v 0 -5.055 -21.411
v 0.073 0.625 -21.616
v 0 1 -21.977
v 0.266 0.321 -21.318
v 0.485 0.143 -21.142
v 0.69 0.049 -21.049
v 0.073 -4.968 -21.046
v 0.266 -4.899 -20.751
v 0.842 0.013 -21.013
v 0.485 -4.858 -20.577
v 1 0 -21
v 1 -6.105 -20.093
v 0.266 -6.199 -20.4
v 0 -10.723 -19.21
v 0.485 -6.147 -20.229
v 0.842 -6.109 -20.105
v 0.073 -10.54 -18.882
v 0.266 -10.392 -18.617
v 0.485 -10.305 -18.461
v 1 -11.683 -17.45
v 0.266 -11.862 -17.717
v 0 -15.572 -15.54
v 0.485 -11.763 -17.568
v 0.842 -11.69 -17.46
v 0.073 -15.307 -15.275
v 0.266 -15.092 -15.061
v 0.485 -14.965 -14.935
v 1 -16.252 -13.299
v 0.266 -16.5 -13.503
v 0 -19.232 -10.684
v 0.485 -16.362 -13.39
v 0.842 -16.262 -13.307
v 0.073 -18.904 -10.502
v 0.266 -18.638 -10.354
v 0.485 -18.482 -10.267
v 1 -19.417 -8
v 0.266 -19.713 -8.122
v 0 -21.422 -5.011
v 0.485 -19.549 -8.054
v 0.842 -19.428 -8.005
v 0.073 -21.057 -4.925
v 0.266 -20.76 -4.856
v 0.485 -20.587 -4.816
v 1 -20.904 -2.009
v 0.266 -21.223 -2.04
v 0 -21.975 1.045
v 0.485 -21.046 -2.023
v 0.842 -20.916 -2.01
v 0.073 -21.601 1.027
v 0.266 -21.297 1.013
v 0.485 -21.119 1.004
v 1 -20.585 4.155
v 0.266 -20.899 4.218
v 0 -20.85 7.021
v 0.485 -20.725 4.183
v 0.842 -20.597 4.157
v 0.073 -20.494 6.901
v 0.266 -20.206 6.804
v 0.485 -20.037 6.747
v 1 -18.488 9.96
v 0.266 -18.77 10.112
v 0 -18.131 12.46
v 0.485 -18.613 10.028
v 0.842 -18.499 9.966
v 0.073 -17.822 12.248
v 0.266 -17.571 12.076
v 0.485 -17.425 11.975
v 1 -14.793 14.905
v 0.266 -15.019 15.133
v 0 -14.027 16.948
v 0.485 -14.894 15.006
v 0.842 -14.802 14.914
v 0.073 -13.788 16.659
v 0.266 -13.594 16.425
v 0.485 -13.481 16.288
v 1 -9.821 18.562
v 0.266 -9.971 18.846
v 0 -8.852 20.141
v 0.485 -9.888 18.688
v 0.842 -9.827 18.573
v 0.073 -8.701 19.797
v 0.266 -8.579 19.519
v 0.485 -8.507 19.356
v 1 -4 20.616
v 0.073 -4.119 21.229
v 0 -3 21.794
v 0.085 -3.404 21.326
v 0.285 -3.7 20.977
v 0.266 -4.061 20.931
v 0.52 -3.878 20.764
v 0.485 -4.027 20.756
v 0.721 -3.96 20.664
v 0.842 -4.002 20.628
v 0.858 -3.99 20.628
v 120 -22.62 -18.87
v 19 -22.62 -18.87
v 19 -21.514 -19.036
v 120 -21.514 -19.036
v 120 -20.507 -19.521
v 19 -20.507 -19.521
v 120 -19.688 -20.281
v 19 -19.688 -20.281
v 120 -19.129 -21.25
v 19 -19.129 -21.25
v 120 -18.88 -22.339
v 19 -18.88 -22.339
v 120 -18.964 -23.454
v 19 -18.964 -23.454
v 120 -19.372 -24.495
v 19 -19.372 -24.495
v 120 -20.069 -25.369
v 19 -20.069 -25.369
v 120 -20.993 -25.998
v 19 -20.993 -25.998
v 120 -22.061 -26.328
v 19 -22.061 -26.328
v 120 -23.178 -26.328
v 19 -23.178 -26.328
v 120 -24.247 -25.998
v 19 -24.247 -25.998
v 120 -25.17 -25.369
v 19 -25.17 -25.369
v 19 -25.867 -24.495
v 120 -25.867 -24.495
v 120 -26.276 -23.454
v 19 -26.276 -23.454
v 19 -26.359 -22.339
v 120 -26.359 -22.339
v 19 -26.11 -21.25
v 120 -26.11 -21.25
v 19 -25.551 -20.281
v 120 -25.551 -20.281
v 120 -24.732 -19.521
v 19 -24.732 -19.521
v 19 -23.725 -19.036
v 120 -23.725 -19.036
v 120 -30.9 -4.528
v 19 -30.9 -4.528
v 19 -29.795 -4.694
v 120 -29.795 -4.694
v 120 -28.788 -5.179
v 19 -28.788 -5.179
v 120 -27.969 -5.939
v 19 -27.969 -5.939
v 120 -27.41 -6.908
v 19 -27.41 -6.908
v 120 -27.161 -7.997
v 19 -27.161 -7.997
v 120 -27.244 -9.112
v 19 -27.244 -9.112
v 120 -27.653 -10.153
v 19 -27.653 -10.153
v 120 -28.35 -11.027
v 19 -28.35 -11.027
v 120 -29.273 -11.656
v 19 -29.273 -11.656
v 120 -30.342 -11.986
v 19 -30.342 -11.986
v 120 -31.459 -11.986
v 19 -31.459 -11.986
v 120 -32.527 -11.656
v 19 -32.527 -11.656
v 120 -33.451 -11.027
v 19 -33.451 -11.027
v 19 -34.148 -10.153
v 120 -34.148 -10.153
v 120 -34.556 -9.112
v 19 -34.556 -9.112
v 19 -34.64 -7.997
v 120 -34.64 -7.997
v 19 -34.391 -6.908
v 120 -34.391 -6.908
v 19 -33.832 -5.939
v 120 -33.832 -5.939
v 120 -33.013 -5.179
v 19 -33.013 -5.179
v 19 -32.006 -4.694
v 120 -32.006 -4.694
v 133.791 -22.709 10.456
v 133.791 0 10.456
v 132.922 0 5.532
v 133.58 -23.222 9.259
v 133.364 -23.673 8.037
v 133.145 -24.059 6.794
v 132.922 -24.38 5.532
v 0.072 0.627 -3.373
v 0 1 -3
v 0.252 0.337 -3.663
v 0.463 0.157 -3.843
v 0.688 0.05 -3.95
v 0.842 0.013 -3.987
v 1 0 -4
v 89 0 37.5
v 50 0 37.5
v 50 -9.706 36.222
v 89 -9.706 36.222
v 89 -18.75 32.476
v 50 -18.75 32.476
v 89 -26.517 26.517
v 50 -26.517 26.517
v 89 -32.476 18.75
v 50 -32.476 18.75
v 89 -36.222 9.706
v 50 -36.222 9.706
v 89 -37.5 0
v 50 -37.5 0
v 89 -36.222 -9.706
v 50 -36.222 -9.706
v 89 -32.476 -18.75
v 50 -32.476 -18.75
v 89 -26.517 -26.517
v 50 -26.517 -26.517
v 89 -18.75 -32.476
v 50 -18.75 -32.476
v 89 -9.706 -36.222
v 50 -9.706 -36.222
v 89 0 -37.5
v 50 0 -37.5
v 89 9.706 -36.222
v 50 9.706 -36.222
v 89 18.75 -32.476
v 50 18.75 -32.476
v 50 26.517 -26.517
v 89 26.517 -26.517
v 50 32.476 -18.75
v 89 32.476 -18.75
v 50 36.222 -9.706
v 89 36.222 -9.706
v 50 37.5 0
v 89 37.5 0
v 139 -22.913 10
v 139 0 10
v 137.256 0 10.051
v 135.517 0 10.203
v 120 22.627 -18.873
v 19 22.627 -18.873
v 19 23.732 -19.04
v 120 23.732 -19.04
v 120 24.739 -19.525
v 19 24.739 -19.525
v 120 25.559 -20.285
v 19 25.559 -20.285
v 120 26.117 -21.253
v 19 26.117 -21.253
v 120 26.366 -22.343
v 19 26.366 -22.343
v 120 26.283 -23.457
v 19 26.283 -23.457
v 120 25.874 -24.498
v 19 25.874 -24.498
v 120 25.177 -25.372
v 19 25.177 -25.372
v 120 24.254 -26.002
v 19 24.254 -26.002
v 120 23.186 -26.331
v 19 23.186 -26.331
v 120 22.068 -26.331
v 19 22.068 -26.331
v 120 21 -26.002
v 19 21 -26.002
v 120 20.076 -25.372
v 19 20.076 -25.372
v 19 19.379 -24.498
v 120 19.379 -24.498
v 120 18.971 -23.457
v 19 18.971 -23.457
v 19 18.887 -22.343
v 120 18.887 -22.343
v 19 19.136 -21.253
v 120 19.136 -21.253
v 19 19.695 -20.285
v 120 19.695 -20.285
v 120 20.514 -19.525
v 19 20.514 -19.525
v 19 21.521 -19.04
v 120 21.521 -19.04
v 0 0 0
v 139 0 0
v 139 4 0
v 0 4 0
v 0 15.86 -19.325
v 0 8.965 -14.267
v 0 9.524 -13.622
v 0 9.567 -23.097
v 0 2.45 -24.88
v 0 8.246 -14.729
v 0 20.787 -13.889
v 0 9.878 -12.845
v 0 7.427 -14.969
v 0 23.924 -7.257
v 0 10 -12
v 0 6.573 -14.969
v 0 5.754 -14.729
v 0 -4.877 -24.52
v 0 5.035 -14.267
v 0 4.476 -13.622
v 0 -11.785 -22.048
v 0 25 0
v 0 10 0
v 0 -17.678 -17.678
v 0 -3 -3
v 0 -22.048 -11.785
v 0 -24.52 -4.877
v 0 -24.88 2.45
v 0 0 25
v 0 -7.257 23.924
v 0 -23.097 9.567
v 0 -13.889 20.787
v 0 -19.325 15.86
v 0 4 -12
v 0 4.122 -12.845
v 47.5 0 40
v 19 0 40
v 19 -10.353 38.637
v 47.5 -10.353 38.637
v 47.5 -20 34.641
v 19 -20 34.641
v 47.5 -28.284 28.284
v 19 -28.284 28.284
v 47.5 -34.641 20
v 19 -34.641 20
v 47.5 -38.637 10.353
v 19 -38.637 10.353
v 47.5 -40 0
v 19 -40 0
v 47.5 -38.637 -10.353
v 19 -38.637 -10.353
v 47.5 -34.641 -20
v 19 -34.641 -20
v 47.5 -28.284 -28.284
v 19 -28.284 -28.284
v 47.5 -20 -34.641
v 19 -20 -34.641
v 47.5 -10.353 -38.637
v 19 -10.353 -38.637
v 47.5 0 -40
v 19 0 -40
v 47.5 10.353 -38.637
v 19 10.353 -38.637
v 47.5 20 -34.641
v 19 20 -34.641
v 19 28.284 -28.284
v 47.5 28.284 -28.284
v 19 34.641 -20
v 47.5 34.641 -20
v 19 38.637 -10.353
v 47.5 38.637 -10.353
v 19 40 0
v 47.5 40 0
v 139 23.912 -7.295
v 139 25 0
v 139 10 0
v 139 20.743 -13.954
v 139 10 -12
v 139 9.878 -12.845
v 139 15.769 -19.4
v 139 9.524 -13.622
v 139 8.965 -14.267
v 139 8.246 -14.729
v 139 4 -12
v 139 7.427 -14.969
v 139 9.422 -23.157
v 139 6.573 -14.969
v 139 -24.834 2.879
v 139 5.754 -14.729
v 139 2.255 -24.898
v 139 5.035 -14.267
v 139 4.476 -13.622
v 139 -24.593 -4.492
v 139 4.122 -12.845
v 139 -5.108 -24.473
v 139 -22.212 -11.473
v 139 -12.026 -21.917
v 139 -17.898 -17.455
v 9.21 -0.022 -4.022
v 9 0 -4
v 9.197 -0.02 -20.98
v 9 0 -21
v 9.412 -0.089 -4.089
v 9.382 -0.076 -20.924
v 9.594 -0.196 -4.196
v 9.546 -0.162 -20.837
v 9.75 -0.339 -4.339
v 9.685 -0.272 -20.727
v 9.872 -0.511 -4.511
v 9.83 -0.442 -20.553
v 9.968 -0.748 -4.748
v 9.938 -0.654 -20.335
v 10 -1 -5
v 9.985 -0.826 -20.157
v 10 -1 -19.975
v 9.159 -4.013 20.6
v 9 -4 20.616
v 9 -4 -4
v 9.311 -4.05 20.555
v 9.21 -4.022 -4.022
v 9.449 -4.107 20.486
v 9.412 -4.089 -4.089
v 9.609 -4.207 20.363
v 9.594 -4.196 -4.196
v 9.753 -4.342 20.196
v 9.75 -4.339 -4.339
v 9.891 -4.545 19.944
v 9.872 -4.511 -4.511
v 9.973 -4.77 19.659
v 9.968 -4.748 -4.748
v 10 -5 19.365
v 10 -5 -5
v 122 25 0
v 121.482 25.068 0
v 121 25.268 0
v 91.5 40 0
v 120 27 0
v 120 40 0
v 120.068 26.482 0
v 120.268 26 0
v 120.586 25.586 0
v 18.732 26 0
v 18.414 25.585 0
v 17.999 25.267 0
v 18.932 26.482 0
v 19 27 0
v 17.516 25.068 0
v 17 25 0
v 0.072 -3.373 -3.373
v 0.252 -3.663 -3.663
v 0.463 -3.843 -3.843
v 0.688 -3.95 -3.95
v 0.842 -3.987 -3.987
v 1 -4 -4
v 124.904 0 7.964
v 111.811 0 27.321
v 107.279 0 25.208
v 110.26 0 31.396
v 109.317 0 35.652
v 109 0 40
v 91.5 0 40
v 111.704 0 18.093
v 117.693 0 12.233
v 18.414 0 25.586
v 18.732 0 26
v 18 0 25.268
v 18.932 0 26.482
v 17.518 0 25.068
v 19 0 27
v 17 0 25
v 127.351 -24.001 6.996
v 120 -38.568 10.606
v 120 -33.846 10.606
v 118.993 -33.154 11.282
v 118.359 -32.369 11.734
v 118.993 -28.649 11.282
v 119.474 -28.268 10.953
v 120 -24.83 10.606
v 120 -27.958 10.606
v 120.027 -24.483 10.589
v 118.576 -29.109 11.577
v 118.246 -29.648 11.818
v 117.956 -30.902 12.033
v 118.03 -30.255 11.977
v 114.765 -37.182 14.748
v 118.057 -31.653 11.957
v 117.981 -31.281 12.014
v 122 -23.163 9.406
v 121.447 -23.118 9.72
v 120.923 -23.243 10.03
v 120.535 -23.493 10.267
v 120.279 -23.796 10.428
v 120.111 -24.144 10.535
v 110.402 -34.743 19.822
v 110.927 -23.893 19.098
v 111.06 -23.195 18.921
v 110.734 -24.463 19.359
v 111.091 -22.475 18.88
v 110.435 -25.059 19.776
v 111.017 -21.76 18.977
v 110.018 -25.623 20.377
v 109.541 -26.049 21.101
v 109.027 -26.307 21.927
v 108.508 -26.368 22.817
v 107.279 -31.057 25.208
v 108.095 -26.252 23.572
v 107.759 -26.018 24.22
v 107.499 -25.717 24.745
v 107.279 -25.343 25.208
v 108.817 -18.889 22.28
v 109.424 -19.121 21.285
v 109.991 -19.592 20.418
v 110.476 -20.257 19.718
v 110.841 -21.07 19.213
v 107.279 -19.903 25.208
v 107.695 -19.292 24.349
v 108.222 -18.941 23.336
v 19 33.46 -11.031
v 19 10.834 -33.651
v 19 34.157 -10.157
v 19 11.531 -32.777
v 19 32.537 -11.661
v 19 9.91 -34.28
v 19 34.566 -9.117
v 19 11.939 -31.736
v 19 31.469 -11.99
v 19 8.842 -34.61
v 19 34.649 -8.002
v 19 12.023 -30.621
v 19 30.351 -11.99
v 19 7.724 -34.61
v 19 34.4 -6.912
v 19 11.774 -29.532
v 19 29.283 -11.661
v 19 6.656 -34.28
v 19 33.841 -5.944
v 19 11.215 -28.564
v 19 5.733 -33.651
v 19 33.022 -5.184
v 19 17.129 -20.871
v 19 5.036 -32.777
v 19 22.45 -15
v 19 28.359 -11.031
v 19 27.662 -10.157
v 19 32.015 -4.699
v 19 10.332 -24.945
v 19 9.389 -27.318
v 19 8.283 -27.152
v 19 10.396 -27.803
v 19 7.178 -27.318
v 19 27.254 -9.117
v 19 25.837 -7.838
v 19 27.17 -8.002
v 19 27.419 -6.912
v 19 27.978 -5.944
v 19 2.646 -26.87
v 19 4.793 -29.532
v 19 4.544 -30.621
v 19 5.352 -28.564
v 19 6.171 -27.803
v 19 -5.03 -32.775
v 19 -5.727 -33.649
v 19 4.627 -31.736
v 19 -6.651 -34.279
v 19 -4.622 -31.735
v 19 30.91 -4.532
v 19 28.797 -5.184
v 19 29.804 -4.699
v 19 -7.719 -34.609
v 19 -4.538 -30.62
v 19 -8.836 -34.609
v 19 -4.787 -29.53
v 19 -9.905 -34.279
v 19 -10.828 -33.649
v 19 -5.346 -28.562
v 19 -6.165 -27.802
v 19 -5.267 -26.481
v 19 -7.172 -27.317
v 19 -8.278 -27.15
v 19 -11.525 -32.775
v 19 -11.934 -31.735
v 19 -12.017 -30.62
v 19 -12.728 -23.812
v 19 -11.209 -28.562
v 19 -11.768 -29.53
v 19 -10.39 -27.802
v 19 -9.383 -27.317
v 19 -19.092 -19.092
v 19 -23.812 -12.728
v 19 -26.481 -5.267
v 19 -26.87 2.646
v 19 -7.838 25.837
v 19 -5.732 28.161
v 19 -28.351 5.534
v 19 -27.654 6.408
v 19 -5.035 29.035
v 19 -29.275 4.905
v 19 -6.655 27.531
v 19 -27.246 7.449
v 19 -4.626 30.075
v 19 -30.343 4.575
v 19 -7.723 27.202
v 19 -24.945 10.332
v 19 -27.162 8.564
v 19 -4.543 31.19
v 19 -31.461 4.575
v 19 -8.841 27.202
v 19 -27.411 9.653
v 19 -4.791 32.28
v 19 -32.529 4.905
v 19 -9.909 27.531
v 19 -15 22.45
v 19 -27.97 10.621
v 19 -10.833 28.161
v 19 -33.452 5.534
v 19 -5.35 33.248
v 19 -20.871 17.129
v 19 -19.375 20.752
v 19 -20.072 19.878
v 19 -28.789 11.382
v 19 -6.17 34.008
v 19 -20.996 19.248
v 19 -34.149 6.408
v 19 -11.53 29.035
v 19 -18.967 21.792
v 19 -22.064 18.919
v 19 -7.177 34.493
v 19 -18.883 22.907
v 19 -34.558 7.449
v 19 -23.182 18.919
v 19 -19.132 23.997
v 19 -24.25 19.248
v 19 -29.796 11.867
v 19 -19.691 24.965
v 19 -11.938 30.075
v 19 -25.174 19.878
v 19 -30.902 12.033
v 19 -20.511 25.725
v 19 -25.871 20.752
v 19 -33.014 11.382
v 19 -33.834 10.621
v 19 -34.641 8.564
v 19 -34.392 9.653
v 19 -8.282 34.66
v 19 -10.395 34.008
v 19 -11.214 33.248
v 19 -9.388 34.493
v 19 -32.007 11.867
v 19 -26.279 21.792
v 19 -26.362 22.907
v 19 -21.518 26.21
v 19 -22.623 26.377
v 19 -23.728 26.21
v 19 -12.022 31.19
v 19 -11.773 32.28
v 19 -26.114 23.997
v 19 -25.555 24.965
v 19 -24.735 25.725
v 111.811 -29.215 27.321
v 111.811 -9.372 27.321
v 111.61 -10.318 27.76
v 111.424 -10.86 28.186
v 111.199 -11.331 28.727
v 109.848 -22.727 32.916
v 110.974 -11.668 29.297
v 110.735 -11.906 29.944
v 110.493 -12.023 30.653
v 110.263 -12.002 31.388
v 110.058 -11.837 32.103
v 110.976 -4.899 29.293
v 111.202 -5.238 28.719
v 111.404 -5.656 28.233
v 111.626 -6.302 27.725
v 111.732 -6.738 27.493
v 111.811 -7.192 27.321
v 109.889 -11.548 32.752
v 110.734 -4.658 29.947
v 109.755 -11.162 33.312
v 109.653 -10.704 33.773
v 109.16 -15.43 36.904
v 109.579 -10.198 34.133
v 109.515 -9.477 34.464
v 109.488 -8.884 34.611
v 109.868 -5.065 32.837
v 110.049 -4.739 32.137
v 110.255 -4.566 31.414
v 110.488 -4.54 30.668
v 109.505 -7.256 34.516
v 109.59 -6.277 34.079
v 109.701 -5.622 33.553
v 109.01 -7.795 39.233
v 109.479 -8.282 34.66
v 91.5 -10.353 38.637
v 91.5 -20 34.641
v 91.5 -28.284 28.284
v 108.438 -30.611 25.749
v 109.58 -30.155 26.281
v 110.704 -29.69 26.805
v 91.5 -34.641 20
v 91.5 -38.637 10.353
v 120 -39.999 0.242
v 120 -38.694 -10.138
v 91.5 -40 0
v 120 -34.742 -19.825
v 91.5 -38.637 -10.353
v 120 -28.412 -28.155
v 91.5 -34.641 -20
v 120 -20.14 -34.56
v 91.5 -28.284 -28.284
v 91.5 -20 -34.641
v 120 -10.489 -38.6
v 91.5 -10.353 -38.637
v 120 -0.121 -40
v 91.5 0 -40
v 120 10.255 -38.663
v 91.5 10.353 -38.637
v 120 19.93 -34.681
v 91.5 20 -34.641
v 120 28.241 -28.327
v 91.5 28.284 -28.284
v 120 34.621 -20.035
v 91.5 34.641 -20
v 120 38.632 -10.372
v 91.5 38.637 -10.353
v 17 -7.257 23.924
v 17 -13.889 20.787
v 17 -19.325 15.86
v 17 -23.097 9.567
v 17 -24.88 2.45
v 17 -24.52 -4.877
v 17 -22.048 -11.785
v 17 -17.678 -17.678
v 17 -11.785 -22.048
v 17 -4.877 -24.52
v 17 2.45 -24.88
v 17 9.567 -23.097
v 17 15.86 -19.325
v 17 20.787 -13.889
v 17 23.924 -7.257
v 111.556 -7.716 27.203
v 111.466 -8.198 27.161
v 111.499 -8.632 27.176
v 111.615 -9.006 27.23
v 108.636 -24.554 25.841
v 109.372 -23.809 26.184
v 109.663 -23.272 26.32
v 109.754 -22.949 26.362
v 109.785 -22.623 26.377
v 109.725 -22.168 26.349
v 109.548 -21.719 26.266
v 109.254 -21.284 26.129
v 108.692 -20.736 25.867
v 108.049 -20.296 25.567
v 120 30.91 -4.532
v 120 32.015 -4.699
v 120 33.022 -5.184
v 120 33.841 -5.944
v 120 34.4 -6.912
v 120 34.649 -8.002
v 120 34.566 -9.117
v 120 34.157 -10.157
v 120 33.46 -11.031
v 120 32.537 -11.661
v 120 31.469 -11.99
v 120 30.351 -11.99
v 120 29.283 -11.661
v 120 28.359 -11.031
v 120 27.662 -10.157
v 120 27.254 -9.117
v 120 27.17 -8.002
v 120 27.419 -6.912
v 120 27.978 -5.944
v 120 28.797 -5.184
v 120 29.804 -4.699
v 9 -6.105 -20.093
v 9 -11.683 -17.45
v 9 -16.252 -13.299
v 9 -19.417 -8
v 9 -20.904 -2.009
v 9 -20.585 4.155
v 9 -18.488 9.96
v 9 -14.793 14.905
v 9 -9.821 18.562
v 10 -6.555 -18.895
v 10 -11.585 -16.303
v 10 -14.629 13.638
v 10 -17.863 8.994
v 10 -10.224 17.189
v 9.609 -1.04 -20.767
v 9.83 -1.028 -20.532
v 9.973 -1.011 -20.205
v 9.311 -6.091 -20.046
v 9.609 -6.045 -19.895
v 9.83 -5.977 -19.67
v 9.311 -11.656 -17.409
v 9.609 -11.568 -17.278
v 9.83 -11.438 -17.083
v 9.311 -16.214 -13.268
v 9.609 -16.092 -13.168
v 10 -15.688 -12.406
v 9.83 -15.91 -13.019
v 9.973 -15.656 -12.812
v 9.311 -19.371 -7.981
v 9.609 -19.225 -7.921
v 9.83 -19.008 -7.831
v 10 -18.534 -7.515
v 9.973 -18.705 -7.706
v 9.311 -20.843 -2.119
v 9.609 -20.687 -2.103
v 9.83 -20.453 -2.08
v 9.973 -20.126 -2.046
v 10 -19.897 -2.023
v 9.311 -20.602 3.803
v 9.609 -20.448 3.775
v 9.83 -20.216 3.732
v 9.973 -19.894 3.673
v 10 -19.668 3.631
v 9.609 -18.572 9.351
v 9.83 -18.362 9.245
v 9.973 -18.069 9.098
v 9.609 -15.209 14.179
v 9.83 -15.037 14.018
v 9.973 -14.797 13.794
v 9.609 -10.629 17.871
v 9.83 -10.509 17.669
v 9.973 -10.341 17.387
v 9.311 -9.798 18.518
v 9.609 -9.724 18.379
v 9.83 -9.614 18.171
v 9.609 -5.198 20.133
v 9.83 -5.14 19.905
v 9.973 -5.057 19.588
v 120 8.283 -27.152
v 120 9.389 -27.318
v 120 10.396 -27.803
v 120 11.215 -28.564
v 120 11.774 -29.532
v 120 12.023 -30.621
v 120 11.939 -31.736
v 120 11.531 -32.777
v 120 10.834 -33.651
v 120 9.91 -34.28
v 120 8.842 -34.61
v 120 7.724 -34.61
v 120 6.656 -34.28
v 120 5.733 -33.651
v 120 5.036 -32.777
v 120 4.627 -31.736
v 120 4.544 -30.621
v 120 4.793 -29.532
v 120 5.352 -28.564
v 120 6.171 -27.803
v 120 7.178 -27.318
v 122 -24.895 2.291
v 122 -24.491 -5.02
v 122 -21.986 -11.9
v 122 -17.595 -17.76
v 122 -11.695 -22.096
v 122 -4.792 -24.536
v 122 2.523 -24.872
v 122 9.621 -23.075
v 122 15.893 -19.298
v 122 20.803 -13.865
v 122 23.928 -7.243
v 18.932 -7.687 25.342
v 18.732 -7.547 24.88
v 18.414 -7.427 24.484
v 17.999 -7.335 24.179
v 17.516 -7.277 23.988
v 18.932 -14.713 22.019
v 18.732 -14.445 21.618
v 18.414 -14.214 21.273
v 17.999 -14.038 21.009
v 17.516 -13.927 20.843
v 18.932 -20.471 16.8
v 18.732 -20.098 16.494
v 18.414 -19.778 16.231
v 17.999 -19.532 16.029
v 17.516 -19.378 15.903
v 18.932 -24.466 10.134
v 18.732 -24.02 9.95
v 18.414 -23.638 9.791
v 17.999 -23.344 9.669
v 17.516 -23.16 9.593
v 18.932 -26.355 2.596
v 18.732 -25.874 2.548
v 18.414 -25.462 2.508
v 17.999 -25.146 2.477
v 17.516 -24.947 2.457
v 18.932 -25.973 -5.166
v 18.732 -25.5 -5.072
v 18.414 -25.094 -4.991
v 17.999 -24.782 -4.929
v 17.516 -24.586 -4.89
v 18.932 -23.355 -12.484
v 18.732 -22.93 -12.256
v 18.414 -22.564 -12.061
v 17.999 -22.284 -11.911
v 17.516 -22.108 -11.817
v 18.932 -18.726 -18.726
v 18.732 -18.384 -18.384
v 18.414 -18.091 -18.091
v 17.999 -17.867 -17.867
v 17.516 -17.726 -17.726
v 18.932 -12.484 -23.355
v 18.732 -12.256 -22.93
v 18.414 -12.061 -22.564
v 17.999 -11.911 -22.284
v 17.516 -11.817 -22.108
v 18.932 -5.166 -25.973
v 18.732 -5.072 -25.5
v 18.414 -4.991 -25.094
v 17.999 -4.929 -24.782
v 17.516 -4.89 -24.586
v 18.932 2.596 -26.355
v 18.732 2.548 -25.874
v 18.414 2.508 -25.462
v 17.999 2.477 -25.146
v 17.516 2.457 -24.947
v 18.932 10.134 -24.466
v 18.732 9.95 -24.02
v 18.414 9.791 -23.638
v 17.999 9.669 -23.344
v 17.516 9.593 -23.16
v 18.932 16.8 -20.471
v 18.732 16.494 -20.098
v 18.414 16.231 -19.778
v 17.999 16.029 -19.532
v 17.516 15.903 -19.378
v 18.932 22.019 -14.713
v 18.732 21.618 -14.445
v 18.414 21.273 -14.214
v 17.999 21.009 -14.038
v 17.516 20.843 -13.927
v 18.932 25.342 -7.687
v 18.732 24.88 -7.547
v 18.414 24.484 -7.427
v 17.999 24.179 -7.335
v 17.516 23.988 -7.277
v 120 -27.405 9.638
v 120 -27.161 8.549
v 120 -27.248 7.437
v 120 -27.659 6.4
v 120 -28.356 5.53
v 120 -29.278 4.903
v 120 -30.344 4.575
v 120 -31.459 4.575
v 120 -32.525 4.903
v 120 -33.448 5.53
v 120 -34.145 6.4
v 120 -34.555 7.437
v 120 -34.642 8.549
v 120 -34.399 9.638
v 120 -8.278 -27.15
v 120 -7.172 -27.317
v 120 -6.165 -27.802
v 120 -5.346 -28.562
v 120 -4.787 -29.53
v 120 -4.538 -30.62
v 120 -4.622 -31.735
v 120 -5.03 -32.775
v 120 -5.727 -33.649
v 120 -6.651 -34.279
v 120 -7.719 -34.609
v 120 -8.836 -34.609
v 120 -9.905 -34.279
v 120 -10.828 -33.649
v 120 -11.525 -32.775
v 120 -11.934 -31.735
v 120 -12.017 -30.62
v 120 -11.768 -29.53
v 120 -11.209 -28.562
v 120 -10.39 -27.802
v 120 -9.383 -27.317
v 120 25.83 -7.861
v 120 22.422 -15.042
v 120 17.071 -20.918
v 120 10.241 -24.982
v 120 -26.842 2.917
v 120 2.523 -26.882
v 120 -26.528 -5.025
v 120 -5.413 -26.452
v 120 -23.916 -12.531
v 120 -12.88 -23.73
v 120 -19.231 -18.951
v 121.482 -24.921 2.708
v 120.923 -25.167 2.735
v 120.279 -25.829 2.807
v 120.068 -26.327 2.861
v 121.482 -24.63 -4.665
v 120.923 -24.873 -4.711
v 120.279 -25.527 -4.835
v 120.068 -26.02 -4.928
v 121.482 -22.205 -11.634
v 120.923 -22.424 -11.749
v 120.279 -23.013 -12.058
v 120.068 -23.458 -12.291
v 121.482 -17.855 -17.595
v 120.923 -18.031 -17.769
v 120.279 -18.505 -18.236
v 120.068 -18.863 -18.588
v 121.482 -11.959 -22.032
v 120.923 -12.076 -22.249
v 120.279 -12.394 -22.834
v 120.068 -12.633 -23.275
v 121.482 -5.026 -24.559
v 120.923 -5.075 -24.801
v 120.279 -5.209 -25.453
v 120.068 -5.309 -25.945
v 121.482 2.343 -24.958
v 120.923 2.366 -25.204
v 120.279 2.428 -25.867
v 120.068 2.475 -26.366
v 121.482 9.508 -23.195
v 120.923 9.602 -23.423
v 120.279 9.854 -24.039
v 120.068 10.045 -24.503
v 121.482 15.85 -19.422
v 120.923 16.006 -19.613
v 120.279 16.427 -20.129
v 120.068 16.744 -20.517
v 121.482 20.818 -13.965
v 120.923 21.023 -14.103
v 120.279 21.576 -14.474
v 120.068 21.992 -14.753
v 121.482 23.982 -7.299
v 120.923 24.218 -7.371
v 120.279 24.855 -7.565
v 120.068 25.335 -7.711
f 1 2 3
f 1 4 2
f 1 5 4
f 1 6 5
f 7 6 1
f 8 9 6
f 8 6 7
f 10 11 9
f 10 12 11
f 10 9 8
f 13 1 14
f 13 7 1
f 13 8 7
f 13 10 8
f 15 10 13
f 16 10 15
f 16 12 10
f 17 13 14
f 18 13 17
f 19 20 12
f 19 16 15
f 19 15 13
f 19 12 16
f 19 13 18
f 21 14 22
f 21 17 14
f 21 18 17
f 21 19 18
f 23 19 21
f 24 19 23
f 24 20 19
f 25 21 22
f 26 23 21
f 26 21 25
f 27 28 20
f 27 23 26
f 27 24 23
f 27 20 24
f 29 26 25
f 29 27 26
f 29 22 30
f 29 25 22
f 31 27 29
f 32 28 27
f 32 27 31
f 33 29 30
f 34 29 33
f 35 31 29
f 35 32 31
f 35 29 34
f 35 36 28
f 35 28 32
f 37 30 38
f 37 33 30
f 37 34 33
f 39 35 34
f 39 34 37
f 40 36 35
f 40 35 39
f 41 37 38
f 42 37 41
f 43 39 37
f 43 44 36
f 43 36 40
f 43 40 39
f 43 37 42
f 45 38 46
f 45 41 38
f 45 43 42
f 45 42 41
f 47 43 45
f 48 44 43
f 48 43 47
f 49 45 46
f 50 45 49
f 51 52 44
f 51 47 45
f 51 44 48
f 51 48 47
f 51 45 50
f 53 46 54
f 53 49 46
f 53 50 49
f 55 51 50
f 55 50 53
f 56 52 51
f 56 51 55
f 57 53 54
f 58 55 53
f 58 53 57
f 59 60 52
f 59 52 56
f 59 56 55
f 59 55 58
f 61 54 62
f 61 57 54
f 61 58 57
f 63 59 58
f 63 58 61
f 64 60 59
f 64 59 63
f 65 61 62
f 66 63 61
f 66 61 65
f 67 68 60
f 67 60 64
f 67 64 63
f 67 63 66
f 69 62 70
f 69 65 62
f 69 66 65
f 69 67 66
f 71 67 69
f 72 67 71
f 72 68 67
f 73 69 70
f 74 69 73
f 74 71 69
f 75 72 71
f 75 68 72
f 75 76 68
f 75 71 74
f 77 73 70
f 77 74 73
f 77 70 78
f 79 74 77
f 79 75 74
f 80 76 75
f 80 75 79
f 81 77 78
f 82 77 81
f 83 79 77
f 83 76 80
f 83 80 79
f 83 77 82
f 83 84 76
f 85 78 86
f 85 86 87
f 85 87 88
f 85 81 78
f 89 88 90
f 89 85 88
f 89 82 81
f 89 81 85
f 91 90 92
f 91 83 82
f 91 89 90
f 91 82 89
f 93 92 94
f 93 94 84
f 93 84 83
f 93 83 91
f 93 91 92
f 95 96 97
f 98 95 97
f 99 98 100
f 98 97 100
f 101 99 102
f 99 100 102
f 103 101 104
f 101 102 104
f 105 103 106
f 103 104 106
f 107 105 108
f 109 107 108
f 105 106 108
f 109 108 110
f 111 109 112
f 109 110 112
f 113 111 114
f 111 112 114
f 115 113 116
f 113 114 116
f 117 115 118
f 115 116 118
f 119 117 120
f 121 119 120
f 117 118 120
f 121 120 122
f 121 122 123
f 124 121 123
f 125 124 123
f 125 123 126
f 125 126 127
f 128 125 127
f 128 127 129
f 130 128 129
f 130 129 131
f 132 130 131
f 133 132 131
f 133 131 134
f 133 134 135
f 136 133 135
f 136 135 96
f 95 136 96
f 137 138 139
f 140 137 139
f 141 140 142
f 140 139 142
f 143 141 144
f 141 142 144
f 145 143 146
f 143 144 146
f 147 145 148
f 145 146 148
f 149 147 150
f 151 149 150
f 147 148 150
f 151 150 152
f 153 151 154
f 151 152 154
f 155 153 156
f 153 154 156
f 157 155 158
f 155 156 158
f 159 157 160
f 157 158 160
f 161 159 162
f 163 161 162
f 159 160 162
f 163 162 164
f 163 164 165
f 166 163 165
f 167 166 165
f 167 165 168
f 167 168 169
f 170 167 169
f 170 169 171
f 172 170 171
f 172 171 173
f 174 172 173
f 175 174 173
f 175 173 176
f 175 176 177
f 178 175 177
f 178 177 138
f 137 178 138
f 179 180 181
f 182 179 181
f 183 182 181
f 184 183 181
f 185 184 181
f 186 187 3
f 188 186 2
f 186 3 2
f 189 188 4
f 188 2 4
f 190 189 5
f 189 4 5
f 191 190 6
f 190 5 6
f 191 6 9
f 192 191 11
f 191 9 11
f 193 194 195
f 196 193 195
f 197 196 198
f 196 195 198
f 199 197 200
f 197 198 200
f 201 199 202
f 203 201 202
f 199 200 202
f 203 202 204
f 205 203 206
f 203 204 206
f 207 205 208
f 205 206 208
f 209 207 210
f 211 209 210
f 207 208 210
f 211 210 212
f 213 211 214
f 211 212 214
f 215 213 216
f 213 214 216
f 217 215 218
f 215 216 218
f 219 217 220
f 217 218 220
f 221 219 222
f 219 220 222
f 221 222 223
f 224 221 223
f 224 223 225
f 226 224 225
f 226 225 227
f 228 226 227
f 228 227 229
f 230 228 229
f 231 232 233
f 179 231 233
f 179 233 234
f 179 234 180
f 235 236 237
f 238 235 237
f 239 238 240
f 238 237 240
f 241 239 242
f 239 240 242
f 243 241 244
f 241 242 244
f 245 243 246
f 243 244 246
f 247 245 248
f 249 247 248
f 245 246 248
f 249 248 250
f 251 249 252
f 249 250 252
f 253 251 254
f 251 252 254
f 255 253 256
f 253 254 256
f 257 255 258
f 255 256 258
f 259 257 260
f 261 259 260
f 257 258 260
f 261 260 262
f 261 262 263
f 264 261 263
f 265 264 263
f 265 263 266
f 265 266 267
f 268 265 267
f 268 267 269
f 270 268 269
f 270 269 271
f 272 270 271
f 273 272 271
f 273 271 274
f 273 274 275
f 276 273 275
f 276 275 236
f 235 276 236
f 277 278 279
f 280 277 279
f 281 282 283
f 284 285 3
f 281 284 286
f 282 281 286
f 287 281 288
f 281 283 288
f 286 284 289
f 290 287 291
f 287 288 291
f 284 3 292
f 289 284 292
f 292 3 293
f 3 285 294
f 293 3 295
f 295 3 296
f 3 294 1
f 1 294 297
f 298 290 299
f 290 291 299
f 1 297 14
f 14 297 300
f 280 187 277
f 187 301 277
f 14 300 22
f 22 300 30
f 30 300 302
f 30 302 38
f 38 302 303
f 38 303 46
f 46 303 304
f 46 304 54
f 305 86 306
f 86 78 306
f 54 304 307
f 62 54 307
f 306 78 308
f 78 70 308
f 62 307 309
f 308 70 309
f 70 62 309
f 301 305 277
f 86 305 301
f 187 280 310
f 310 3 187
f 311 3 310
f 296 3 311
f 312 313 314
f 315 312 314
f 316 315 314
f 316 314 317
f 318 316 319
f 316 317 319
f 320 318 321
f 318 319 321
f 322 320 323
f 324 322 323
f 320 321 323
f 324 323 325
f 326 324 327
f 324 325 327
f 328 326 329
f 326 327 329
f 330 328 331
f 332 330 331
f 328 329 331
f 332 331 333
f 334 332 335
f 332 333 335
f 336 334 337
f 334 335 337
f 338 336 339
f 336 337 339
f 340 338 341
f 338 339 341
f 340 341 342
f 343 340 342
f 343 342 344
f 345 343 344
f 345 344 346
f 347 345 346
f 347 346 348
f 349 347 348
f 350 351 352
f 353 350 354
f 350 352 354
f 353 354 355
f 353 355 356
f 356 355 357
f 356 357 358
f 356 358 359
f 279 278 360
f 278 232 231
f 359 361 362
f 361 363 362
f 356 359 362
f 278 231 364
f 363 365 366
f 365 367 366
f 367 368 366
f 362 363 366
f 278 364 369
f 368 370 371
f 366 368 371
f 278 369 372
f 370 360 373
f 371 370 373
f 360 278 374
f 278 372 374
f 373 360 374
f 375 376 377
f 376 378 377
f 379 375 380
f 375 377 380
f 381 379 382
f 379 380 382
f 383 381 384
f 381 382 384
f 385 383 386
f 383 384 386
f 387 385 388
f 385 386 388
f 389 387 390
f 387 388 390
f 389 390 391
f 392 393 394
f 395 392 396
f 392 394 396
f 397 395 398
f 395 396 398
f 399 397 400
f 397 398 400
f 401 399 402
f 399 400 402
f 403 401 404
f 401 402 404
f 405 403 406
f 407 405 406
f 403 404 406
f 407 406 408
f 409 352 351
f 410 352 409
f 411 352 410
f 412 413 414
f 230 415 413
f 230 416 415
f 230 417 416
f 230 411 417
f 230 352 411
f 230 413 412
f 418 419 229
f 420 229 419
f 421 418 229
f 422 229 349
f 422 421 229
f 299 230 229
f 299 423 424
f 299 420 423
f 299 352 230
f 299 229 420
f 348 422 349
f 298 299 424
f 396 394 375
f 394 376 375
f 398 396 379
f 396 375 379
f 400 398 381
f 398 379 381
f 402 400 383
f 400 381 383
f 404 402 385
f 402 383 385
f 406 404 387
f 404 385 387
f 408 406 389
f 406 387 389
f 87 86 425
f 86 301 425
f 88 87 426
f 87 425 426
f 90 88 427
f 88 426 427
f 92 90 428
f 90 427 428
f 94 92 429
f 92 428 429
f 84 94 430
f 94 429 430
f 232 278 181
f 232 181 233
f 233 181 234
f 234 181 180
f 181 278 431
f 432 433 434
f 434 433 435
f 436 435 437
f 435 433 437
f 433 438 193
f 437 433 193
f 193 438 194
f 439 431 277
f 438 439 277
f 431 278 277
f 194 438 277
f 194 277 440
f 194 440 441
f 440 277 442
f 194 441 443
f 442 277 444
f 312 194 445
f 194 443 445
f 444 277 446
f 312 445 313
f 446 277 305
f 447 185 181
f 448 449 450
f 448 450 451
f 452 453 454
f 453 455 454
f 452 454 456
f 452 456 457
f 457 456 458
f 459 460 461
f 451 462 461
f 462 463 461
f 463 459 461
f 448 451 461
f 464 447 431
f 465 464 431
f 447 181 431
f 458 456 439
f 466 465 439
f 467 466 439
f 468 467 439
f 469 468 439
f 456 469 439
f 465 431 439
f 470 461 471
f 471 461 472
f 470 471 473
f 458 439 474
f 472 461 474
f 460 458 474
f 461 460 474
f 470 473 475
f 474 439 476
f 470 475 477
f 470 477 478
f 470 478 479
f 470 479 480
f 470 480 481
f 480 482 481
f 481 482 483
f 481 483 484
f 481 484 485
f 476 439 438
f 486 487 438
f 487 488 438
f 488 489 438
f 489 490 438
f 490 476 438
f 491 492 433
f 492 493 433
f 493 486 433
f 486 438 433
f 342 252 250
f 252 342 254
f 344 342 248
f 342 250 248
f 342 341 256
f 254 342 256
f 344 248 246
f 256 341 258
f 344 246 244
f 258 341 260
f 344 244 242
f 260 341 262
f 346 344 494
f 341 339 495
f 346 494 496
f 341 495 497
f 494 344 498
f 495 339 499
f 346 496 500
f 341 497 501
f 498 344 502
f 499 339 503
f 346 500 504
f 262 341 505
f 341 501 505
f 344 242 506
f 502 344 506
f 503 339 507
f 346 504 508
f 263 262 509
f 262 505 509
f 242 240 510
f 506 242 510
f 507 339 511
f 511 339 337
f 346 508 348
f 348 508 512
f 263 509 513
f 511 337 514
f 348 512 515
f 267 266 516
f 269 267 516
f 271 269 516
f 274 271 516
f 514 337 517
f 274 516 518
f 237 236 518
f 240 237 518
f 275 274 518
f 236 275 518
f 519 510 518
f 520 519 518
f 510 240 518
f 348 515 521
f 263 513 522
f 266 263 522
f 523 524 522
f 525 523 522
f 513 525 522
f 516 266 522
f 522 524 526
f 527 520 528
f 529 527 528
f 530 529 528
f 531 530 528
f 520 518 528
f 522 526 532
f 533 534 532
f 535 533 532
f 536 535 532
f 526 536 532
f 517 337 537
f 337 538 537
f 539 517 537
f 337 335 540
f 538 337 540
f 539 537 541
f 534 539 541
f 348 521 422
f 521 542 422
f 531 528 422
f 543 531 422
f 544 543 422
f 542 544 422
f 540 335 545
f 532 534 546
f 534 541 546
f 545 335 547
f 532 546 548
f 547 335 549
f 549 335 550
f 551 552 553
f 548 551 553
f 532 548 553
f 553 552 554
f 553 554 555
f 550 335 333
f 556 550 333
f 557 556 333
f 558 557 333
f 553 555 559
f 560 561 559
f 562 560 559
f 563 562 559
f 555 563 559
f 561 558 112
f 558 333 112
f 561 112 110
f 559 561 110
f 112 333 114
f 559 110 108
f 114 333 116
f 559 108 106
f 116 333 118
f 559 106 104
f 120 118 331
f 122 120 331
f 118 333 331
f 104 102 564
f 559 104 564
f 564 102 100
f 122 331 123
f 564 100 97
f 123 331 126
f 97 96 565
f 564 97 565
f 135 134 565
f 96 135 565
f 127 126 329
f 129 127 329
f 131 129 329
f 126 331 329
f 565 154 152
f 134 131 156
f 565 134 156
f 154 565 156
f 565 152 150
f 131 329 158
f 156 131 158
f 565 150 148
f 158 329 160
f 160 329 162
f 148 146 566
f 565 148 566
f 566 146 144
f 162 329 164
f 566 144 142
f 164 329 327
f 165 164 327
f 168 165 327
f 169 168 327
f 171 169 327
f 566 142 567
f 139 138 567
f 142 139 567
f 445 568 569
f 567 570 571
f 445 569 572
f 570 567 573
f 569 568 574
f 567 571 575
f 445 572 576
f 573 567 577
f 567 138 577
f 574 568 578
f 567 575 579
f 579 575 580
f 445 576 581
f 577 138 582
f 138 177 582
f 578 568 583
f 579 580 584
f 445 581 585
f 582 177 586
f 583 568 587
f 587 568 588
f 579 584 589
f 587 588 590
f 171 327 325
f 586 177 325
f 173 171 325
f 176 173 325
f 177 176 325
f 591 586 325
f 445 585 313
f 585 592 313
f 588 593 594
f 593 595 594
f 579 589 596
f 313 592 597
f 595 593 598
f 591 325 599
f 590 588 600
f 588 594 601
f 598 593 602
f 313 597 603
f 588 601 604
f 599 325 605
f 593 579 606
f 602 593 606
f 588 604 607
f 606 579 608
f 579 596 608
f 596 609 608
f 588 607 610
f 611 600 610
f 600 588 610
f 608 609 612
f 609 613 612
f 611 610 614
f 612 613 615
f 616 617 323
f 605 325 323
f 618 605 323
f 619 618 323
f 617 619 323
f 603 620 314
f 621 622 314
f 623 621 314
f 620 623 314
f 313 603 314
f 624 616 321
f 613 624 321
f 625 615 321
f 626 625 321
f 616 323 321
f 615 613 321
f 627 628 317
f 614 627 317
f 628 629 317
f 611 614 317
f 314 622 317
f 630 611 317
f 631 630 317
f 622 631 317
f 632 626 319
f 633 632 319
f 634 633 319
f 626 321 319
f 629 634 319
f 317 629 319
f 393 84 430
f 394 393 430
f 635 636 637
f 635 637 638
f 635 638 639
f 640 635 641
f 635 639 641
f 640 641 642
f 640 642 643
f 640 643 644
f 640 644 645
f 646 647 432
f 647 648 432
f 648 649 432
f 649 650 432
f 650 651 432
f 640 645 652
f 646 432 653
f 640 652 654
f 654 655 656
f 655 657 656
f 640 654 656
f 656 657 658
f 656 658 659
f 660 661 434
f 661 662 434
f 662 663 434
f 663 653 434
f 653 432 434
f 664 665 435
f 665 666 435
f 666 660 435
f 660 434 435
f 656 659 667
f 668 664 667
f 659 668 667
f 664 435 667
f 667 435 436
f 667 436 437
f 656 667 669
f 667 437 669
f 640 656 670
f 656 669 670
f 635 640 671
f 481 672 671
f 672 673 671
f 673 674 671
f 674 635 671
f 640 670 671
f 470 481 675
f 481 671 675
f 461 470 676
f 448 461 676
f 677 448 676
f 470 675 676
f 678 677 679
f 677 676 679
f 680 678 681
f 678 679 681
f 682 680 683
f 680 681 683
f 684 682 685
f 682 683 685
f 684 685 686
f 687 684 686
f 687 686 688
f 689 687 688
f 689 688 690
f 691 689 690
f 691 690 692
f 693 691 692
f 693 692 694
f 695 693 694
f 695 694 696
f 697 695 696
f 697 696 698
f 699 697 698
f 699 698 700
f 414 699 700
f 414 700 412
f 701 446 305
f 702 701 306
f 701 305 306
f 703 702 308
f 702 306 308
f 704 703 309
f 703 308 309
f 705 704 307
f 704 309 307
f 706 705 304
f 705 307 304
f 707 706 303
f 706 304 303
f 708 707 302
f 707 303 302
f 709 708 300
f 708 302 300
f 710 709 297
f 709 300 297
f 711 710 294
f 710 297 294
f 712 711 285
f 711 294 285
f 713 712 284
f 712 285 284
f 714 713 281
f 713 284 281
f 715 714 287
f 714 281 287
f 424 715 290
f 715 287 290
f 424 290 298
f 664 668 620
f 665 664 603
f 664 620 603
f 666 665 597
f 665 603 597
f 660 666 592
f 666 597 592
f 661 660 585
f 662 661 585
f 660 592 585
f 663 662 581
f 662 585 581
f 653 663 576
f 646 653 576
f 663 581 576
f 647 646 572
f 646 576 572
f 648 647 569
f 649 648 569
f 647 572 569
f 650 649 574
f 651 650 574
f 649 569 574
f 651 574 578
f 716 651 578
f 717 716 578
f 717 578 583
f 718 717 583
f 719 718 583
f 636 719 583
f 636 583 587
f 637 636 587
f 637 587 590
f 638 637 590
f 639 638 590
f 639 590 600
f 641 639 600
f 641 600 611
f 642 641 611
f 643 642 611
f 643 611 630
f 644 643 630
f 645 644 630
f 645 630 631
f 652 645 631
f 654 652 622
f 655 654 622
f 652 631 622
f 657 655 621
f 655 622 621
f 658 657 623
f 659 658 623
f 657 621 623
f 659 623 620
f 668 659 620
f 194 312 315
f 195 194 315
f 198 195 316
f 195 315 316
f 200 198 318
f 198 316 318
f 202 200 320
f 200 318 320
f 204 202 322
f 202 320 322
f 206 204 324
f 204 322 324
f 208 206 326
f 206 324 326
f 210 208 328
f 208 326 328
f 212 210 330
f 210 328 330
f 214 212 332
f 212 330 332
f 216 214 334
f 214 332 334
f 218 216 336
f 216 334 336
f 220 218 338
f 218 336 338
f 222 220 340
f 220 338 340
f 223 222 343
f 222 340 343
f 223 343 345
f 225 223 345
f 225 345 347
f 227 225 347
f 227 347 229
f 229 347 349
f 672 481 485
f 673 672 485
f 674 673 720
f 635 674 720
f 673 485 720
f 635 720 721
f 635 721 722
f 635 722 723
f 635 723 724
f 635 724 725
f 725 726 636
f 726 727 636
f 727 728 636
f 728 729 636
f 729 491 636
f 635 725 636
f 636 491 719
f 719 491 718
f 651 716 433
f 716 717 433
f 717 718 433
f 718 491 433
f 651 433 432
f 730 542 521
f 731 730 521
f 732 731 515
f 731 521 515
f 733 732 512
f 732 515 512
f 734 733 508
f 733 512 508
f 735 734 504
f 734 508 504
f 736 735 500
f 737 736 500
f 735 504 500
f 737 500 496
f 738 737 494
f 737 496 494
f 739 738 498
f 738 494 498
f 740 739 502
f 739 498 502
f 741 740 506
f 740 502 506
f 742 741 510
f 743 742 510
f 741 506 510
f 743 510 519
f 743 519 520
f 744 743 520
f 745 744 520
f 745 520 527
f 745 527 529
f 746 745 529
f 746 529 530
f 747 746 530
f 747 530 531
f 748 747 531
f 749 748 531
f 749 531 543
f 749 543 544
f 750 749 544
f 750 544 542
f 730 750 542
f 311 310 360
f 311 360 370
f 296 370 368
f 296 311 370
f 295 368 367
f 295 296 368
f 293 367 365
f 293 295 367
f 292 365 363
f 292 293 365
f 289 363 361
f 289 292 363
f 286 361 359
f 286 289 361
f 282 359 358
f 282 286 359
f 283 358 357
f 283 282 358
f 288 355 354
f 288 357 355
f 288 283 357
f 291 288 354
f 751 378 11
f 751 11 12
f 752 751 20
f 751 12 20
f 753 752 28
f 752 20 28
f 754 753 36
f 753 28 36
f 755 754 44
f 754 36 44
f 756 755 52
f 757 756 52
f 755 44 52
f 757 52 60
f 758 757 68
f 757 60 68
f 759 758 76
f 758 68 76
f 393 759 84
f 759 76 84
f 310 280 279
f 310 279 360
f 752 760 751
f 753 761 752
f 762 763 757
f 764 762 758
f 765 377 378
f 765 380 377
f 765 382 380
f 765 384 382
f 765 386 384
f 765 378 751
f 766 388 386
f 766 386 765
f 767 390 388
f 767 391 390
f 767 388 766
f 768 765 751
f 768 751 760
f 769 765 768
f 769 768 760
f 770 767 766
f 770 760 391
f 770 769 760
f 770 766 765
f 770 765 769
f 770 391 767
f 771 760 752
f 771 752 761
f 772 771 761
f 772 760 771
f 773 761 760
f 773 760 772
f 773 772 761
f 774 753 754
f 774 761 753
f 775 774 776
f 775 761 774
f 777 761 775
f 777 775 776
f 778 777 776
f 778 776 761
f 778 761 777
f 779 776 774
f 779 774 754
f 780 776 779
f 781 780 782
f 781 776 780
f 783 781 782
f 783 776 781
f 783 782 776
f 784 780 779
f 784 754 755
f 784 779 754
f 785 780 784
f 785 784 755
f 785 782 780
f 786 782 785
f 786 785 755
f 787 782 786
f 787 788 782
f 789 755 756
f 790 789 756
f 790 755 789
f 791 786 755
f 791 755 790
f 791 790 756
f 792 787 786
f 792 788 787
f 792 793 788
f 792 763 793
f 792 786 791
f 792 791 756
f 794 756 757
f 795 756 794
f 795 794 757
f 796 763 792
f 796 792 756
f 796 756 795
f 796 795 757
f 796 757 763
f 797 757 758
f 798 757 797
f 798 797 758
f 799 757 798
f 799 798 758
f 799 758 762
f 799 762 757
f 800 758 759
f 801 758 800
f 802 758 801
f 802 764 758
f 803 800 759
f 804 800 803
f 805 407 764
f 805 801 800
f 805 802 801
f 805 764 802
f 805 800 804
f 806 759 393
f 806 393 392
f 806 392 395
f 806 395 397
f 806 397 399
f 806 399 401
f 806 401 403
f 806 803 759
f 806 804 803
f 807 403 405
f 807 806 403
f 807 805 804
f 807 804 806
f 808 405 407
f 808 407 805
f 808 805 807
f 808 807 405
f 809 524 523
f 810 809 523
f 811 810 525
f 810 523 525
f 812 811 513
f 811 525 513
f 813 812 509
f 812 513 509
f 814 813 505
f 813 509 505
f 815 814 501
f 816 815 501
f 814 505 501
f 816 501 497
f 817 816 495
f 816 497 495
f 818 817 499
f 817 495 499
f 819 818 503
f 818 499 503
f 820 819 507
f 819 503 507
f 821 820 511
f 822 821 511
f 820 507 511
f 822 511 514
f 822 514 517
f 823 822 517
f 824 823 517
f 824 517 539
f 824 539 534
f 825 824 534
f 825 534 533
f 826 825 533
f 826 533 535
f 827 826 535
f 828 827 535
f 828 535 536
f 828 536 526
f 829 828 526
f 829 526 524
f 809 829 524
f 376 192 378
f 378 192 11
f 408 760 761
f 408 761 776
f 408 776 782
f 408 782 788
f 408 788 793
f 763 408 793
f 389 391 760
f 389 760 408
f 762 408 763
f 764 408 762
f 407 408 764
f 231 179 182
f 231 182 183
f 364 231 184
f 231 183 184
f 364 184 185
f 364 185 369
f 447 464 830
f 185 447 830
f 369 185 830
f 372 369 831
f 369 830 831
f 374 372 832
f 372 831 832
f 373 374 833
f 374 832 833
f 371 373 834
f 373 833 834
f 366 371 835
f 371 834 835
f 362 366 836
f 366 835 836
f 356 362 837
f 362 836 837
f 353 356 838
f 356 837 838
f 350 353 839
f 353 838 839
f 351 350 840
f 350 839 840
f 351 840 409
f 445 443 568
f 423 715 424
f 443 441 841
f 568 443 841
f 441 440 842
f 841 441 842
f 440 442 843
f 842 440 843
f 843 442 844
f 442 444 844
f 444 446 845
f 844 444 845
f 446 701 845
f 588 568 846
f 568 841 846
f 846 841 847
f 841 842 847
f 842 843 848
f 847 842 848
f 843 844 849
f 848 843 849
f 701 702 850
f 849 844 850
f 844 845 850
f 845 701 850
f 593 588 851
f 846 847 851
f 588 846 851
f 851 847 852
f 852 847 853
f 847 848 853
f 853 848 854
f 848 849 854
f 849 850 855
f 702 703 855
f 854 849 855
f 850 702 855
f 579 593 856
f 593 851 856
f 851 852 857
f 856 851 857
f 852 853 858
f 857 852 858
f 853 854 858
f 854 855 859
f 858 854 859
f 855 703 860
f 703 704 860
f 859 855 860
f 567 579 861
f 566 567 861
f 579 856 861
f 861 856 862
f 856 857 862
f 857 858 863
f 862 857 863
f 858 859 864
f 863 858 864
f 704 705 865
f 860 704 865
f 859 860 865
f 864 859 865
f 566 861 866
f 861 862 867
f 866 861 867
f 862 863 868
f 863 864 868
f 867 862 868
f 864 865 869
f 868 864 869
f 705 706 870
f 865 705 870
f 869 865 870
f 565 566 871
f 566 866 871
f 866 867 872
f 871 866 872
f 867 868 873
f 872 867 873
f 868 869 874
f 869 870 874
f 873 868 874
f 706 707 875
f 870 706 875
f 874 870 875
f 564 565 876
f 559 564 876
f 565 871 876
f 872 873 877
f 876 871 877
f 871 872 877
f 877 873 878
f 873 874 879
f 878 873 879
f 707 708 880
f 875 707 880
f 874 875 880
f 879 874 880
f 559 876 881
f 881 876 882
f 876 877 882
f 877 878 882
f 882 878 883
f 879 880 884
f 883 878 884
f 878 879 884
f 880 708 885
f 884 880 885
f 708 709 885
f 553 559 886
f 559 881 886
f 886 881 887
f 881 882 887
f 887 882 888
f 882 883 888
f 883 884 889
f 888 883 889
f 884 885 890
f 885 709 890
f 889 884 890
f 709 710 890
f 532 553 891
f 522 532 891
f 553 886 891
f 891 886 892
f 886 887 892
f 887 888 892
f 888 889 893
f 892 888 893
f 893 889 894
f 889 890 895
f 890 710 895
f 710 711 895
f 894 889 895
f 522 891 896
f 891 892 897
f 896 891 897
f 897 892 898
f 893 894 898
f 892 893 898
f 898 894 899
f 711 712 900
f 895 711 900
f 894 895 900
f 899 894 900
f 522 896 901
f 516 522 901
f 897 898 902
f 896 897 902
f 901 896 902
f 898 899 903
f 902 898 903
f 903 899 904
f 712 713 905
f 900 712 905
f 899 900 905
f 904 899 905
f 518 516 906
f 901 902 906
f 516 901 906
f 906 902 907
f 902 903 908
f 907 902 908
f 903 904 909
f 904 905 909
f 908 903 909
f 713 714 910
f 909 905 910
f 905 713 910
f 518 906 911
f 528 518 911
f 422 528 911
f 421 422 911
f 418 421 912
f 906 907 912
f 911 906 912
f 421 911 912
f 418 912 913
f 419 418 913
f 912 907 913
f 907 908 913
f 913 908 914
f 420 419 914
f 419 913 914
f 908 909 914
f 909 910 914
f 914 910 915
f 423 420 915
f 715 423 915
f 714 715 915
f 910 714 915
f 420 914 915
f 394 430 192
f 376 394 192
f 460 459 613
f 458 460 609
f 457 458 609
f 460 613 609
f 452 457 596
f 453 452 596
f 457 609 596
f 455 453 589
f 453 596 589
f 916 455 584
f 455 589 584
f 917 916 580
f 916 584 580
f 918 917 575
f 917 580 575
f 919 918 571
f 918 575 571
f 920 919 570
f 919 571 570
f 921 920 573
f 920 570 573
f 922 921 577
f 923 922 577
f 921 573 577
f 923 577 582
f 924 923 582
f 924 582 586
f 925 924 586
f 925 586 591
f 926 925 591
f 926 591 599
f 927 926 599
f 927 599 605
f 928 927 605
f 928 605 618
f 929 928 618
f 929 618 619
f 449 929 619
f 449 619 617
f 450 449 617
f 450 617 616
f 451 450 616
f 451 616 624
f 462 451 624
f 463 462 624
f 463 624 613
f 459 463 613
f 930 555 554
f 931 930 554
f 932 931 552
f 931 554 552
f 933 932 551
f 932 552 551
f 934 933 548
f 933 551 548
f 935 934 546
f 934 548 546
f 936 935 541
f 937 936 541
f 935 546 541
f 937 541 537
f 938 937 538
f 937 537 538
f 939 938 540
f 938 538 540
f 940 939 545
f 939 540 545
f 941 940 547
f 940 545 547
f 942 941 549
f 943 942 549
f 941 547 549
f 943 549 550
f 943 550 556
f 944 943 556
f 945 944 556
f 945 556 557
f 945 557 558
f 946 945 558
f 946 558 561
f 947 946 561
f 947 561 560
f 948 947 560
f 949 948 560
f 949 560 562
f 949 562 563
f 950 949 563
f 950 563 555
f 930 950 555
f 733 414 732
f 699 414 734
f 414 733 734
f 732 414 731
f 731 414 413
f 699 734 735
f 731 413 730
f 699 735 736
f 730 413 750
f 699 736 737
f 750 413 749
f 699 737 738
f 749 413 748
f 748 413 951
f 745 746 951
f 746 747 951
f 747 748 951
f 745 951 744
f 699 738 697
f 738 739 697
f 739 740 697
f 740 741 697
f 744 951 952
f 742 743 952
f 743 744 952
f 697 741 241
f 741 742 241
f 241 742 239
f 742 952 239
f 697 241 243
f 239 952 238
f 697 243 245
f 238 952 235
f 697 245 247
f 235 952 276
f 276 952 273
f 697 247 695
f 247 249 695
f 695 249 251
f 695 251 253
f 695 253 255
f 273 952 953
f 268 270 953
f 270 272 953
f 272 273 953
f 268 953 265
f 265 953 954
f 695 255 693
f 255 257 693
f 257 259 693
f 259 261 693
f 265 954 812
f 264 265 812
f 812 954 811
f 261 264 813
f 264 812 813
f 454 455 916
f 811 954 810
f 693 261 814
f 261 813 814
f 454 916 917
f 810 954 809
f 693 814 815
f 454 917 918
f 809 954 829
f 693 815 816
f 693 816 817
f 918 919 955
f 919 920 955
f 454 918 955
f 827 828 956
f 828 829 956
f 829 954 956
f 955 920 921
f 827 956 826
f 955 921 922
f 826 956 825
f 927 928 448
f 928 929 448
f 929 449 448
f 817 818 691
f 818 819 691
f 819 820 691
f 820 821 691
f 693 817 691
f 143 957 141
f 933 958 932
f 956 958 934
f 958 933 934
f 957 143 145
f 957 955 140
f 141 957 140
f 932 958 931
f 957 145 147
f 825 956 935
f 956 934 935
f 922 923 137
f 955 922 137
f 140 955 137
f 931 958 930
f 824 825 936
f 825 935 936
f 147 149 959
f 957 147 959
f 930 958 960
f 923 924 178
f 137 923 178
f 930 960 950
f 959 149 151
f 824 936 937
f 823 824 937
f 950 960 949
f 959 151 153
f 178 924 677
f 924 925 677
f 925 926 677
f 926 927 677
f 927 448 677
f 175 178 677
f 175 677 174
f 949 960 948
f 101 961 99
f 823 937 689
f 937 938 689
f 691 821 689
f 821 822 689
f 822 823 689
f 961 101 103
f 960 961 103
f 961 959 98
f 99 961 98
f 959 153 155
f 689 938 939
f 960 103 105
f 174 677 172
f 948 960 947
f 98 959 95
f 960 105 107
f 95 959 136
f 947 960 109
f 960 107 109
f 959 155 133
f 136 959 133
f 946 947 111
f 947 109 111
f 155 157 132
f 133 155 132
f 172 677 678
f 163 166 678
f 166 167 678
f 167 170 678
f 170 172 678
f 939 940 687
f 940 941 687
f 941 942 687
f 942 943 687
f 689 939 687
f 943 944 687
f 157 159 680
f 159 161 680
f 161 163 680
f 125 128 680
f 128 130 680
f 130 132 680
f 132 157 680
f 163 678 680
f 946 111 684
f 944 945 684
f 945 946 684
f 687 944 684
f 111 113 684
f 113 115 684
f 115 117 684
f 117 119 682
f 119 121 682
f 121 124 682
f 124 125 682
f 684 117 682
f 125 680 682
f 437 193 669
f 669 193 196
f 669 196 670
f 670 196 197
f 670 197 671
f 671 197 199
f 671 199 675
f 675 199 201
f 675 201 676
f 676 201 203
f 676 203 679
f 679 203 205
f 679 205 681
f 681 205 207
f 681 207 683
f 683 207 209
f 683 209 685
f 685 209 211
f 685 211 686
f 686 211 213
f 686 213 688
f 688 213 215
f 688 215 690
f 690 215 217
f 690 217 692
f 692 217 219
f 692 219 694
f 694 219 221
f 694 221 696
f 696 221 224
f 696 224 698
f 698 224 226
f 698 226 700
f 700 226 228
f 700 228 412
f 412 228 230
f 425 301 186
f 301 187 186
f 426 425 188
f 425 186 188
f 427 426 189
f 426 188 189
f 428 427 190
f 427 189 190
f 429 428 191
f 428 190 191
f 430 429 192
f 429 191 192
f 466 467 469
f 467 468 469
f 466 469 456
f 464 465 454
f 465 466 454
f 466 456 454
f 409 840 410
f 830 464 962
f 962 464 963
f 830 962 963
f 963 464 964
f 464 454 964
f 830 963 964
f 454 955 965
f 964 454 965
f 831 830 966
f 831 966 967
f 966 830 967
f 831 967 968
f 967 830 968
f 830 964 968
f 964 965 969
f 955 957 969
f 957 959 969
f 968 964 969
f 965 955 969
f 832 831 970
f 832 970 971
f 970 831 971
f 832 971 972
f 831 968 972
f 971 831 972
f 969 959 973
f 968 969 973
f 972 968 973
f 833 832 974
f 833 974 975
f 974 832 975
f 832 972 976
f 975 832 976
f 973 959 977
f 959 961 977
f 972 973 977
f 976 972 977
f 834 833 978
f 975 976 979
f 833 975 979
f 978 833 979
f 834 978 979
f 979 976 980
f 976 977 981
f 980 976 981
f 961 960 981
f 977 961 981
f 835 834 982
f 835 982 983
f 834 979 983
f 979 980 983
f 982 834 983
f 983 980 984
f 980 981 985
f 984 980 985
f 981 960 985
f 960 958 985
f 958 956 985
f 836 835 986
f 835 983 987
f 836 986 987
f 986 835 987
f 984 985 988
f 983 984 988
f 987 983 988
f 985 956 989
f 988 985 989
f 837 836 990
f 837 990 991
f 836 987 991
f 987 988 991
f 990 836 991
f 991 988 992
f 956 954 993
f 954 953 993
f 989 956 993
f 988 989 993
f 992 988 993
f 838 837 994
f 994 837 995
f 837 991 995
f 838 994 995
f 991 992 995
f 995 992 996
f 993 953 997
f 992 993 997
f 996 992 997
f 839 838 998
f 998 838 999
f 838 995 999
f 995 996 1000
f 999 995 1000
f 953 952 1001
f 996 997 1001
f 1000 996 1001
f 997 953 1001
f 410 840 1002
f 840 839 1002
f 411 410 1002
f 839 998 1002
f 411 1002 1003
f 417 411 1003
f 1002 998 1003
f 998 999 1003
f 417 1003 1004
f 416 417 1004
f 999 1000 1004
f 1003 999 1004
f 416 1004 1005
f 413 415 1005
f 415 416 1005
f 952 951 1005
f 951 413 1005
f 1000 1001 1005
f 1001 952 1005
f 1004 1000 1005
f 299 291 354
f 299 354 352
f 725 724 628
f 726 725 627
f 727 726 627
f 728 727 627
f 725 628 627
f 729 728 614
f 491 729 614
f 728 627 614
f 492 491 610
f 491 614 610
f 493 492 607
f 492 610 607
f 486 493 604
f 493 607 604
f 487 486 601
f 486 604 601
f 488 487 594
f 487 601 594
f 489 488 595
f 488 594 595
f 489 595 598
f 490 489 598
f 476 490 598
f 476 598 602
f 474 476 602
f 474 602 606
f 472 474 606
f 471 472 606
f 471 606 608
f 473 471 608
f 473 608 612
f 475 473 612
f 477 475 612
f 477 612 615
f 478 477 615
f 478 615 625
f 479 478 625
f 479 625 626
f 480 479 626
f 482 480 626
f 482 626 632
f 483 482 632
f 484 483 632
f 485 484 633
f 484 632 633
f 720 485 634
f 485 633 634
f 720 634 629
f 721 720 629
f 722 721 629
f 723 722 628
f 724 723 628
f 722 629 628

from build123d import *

# Parameters (mm, degrees)
SKETCH2_W          = 44.887778639
SKETCH2_H          = 40.820436252
CUT_EXTRUDE1_DEPTH = 151.069983674
CUT_EXTRUDE2_DEPTH = 151.069983674
SKETCH5_R          = 3.75
CUT_EXTRUDE3_DEPTH = 133.664991614
CUT_EXTRUDE4_DEPTH = 151.069983674
CUT_EXTRUDE5_DEPTH = 10
FILLET1_R          = 1


with BuildPart() as part:
    # Sketch1 → Revolve1 (revolve)
    with BuildSketch(Plane.XY, mode=Mode.PRIVATE) as revolve1_sk:
        with BuildLine():
            Line((0, 0), (139, 0))
            Line((139, 0), (139, 25))
            Line((139, 25), (122, 25))
            ThreePointArc((122, 25), (120.585786438, 25.585786438), (120, 27))
            Line((120, 27), (120, 40))
            Line((120, 40), (91.5, 40))
            Line((91.5, 40), (89, 37.5))
            Line((89, 37.5), (50, 37.5))
            Line((50, 37.5), (47.5, 40))
            Line((47.5, 40), (19, 40))
            Line((19, 40), (19, 27))
            ThreePointArc((19, 27), (18.414213562, 25.585786438), (17, 25))
            Line((17, 25), (0, 25))
            Line((0, 25), (0, 0))
        make_face()
    revolve(revolve1_sk.sketch.rotate(Axis((0, 0, 0), (1, 0, 0)), 90), axis=Axis((0, 0, 0), (1, 0, 0)))

    # Sketch2 → Cut-Extrude1 (cut, through all)
    with BuildSketch(Plane.ZY):
        with Locations((22.44388932, 20.410218126)):
            Rectangle(SKETCH2_W, SKETCH2_H)
    extrude(amount=-CUT_EXTRUDE1_DEPTH, mode=Mode.SUBTRACT)

    # Sketch4 → Cut-Extrude2 (cut, through all)
    with BuildSketch(Plane.ZY):
        with BuildLine():
            Line((0, 4), (-12, 4))
            ThreePointArc((-12, 4), (-15, 7), (-12, 10))
            Line((-12, 10), (0, 10))
            ThreePointArc((0, 10), (3, 7), (0, 4))
        make_face()
    extrude(amount=-CUT_EXTRUDE2_DEPTH, mode=Mode.SUBTRACT)

    # Sketch5 → Cut-Extrude3 (cut, through all)
    with BuildSketch(Plane.ZY.offset(-19)):
        with Locations((-8.282209443, 30.909626441)):
            Circle(SKETCH5_R)
        with Locations((-22.62297233, 22.626635765)):
            Circle(SKETCH5_R)
        with Locations((-30.901659317, 8.283387998)):
            Circle(SKETCH5_R)
        with Locations((-30.90041693, -8.277572517)):
            Circle(SKETCH5_R)
        with Locations((-22.619578006, -22.619578006)):
            Circle(SKETCH5_R)
        with Locations((-8.277572517, -30.90041693)):
            Circle(SKETCH5_R)
        with Locations((8.283387998, -30.901659317)):
            Circle(SKETCH5_R)
        with Locations((22.626635765, -22.62297233)):
            Circle(SKETCH5_R)
        with Locations((30.909626441, -8.282209443)):
            Circle(SKETCH5_R)
    extrude(amount=-CUT_EXTRUDE3_DEPTH, mode=Mode.SUBTRACT)

    # Sketch6 → Cut-Extrude4 (cut, through all)
    with BuildSketch(Plane(origin=(0, 0, 0), x_dir=(1, 0, 0), z_dir=(0, 1, 0))):
        with BuildLine():
            Line((107.279227454, -25.208360839), (111.810766389, -27.321452148))
            ThreePointArc((111.810766389, -27.321452148), (157.26284287, -63.800600209), (133.79055467, -10.45576741))
            Line((133.79055467, -10.45576741), (132.922313782, -5.531728645))
            ThreePointArc((132.922313782, -5.531728645), (117.693349985, -12.23263309), (107.279227454, -25.208360839))
        make_face()
    extrude(amount=-CUT_EXTRUDE4_DEPTH, mode=Mode.SUBTRACT)

    # Sketch7 → Cut-Extrude5 (cut)
    with BuildSketch(Plane.ZY):
        with BuildLine():
            Line((-4, 0), (-21, 0))
            ThreePointArc((-21, 0), (-2.009217424, -20.903661051), (20.615528128, -4))
            Line((20.615528128, -4), (-4, -4))
            Line((-4, -4), (-4, 0))
        make_face()
    extrude(amount=-CUT_EXTRUDE5_DEPTH, mode=Mode.SUBTRACT)

    # Fillet1
    fillet1_edges = [part.edges().sort_by_distance(p)[0] for p in [
        (10, -2, -4),
        (10, -4, 8.307764064),
        (10, -20.903661051, -2.009217424),
        (10, 0, -12.5),
        (0, -2, -4),
        (0, 0, -12.5),
        (0, -20.903661051, -2.009217424),
        (0, -4, 8.307764064),
    ]]
    fillet(fillet1_edges, radius=FILLET1_R)


solid = part.part
